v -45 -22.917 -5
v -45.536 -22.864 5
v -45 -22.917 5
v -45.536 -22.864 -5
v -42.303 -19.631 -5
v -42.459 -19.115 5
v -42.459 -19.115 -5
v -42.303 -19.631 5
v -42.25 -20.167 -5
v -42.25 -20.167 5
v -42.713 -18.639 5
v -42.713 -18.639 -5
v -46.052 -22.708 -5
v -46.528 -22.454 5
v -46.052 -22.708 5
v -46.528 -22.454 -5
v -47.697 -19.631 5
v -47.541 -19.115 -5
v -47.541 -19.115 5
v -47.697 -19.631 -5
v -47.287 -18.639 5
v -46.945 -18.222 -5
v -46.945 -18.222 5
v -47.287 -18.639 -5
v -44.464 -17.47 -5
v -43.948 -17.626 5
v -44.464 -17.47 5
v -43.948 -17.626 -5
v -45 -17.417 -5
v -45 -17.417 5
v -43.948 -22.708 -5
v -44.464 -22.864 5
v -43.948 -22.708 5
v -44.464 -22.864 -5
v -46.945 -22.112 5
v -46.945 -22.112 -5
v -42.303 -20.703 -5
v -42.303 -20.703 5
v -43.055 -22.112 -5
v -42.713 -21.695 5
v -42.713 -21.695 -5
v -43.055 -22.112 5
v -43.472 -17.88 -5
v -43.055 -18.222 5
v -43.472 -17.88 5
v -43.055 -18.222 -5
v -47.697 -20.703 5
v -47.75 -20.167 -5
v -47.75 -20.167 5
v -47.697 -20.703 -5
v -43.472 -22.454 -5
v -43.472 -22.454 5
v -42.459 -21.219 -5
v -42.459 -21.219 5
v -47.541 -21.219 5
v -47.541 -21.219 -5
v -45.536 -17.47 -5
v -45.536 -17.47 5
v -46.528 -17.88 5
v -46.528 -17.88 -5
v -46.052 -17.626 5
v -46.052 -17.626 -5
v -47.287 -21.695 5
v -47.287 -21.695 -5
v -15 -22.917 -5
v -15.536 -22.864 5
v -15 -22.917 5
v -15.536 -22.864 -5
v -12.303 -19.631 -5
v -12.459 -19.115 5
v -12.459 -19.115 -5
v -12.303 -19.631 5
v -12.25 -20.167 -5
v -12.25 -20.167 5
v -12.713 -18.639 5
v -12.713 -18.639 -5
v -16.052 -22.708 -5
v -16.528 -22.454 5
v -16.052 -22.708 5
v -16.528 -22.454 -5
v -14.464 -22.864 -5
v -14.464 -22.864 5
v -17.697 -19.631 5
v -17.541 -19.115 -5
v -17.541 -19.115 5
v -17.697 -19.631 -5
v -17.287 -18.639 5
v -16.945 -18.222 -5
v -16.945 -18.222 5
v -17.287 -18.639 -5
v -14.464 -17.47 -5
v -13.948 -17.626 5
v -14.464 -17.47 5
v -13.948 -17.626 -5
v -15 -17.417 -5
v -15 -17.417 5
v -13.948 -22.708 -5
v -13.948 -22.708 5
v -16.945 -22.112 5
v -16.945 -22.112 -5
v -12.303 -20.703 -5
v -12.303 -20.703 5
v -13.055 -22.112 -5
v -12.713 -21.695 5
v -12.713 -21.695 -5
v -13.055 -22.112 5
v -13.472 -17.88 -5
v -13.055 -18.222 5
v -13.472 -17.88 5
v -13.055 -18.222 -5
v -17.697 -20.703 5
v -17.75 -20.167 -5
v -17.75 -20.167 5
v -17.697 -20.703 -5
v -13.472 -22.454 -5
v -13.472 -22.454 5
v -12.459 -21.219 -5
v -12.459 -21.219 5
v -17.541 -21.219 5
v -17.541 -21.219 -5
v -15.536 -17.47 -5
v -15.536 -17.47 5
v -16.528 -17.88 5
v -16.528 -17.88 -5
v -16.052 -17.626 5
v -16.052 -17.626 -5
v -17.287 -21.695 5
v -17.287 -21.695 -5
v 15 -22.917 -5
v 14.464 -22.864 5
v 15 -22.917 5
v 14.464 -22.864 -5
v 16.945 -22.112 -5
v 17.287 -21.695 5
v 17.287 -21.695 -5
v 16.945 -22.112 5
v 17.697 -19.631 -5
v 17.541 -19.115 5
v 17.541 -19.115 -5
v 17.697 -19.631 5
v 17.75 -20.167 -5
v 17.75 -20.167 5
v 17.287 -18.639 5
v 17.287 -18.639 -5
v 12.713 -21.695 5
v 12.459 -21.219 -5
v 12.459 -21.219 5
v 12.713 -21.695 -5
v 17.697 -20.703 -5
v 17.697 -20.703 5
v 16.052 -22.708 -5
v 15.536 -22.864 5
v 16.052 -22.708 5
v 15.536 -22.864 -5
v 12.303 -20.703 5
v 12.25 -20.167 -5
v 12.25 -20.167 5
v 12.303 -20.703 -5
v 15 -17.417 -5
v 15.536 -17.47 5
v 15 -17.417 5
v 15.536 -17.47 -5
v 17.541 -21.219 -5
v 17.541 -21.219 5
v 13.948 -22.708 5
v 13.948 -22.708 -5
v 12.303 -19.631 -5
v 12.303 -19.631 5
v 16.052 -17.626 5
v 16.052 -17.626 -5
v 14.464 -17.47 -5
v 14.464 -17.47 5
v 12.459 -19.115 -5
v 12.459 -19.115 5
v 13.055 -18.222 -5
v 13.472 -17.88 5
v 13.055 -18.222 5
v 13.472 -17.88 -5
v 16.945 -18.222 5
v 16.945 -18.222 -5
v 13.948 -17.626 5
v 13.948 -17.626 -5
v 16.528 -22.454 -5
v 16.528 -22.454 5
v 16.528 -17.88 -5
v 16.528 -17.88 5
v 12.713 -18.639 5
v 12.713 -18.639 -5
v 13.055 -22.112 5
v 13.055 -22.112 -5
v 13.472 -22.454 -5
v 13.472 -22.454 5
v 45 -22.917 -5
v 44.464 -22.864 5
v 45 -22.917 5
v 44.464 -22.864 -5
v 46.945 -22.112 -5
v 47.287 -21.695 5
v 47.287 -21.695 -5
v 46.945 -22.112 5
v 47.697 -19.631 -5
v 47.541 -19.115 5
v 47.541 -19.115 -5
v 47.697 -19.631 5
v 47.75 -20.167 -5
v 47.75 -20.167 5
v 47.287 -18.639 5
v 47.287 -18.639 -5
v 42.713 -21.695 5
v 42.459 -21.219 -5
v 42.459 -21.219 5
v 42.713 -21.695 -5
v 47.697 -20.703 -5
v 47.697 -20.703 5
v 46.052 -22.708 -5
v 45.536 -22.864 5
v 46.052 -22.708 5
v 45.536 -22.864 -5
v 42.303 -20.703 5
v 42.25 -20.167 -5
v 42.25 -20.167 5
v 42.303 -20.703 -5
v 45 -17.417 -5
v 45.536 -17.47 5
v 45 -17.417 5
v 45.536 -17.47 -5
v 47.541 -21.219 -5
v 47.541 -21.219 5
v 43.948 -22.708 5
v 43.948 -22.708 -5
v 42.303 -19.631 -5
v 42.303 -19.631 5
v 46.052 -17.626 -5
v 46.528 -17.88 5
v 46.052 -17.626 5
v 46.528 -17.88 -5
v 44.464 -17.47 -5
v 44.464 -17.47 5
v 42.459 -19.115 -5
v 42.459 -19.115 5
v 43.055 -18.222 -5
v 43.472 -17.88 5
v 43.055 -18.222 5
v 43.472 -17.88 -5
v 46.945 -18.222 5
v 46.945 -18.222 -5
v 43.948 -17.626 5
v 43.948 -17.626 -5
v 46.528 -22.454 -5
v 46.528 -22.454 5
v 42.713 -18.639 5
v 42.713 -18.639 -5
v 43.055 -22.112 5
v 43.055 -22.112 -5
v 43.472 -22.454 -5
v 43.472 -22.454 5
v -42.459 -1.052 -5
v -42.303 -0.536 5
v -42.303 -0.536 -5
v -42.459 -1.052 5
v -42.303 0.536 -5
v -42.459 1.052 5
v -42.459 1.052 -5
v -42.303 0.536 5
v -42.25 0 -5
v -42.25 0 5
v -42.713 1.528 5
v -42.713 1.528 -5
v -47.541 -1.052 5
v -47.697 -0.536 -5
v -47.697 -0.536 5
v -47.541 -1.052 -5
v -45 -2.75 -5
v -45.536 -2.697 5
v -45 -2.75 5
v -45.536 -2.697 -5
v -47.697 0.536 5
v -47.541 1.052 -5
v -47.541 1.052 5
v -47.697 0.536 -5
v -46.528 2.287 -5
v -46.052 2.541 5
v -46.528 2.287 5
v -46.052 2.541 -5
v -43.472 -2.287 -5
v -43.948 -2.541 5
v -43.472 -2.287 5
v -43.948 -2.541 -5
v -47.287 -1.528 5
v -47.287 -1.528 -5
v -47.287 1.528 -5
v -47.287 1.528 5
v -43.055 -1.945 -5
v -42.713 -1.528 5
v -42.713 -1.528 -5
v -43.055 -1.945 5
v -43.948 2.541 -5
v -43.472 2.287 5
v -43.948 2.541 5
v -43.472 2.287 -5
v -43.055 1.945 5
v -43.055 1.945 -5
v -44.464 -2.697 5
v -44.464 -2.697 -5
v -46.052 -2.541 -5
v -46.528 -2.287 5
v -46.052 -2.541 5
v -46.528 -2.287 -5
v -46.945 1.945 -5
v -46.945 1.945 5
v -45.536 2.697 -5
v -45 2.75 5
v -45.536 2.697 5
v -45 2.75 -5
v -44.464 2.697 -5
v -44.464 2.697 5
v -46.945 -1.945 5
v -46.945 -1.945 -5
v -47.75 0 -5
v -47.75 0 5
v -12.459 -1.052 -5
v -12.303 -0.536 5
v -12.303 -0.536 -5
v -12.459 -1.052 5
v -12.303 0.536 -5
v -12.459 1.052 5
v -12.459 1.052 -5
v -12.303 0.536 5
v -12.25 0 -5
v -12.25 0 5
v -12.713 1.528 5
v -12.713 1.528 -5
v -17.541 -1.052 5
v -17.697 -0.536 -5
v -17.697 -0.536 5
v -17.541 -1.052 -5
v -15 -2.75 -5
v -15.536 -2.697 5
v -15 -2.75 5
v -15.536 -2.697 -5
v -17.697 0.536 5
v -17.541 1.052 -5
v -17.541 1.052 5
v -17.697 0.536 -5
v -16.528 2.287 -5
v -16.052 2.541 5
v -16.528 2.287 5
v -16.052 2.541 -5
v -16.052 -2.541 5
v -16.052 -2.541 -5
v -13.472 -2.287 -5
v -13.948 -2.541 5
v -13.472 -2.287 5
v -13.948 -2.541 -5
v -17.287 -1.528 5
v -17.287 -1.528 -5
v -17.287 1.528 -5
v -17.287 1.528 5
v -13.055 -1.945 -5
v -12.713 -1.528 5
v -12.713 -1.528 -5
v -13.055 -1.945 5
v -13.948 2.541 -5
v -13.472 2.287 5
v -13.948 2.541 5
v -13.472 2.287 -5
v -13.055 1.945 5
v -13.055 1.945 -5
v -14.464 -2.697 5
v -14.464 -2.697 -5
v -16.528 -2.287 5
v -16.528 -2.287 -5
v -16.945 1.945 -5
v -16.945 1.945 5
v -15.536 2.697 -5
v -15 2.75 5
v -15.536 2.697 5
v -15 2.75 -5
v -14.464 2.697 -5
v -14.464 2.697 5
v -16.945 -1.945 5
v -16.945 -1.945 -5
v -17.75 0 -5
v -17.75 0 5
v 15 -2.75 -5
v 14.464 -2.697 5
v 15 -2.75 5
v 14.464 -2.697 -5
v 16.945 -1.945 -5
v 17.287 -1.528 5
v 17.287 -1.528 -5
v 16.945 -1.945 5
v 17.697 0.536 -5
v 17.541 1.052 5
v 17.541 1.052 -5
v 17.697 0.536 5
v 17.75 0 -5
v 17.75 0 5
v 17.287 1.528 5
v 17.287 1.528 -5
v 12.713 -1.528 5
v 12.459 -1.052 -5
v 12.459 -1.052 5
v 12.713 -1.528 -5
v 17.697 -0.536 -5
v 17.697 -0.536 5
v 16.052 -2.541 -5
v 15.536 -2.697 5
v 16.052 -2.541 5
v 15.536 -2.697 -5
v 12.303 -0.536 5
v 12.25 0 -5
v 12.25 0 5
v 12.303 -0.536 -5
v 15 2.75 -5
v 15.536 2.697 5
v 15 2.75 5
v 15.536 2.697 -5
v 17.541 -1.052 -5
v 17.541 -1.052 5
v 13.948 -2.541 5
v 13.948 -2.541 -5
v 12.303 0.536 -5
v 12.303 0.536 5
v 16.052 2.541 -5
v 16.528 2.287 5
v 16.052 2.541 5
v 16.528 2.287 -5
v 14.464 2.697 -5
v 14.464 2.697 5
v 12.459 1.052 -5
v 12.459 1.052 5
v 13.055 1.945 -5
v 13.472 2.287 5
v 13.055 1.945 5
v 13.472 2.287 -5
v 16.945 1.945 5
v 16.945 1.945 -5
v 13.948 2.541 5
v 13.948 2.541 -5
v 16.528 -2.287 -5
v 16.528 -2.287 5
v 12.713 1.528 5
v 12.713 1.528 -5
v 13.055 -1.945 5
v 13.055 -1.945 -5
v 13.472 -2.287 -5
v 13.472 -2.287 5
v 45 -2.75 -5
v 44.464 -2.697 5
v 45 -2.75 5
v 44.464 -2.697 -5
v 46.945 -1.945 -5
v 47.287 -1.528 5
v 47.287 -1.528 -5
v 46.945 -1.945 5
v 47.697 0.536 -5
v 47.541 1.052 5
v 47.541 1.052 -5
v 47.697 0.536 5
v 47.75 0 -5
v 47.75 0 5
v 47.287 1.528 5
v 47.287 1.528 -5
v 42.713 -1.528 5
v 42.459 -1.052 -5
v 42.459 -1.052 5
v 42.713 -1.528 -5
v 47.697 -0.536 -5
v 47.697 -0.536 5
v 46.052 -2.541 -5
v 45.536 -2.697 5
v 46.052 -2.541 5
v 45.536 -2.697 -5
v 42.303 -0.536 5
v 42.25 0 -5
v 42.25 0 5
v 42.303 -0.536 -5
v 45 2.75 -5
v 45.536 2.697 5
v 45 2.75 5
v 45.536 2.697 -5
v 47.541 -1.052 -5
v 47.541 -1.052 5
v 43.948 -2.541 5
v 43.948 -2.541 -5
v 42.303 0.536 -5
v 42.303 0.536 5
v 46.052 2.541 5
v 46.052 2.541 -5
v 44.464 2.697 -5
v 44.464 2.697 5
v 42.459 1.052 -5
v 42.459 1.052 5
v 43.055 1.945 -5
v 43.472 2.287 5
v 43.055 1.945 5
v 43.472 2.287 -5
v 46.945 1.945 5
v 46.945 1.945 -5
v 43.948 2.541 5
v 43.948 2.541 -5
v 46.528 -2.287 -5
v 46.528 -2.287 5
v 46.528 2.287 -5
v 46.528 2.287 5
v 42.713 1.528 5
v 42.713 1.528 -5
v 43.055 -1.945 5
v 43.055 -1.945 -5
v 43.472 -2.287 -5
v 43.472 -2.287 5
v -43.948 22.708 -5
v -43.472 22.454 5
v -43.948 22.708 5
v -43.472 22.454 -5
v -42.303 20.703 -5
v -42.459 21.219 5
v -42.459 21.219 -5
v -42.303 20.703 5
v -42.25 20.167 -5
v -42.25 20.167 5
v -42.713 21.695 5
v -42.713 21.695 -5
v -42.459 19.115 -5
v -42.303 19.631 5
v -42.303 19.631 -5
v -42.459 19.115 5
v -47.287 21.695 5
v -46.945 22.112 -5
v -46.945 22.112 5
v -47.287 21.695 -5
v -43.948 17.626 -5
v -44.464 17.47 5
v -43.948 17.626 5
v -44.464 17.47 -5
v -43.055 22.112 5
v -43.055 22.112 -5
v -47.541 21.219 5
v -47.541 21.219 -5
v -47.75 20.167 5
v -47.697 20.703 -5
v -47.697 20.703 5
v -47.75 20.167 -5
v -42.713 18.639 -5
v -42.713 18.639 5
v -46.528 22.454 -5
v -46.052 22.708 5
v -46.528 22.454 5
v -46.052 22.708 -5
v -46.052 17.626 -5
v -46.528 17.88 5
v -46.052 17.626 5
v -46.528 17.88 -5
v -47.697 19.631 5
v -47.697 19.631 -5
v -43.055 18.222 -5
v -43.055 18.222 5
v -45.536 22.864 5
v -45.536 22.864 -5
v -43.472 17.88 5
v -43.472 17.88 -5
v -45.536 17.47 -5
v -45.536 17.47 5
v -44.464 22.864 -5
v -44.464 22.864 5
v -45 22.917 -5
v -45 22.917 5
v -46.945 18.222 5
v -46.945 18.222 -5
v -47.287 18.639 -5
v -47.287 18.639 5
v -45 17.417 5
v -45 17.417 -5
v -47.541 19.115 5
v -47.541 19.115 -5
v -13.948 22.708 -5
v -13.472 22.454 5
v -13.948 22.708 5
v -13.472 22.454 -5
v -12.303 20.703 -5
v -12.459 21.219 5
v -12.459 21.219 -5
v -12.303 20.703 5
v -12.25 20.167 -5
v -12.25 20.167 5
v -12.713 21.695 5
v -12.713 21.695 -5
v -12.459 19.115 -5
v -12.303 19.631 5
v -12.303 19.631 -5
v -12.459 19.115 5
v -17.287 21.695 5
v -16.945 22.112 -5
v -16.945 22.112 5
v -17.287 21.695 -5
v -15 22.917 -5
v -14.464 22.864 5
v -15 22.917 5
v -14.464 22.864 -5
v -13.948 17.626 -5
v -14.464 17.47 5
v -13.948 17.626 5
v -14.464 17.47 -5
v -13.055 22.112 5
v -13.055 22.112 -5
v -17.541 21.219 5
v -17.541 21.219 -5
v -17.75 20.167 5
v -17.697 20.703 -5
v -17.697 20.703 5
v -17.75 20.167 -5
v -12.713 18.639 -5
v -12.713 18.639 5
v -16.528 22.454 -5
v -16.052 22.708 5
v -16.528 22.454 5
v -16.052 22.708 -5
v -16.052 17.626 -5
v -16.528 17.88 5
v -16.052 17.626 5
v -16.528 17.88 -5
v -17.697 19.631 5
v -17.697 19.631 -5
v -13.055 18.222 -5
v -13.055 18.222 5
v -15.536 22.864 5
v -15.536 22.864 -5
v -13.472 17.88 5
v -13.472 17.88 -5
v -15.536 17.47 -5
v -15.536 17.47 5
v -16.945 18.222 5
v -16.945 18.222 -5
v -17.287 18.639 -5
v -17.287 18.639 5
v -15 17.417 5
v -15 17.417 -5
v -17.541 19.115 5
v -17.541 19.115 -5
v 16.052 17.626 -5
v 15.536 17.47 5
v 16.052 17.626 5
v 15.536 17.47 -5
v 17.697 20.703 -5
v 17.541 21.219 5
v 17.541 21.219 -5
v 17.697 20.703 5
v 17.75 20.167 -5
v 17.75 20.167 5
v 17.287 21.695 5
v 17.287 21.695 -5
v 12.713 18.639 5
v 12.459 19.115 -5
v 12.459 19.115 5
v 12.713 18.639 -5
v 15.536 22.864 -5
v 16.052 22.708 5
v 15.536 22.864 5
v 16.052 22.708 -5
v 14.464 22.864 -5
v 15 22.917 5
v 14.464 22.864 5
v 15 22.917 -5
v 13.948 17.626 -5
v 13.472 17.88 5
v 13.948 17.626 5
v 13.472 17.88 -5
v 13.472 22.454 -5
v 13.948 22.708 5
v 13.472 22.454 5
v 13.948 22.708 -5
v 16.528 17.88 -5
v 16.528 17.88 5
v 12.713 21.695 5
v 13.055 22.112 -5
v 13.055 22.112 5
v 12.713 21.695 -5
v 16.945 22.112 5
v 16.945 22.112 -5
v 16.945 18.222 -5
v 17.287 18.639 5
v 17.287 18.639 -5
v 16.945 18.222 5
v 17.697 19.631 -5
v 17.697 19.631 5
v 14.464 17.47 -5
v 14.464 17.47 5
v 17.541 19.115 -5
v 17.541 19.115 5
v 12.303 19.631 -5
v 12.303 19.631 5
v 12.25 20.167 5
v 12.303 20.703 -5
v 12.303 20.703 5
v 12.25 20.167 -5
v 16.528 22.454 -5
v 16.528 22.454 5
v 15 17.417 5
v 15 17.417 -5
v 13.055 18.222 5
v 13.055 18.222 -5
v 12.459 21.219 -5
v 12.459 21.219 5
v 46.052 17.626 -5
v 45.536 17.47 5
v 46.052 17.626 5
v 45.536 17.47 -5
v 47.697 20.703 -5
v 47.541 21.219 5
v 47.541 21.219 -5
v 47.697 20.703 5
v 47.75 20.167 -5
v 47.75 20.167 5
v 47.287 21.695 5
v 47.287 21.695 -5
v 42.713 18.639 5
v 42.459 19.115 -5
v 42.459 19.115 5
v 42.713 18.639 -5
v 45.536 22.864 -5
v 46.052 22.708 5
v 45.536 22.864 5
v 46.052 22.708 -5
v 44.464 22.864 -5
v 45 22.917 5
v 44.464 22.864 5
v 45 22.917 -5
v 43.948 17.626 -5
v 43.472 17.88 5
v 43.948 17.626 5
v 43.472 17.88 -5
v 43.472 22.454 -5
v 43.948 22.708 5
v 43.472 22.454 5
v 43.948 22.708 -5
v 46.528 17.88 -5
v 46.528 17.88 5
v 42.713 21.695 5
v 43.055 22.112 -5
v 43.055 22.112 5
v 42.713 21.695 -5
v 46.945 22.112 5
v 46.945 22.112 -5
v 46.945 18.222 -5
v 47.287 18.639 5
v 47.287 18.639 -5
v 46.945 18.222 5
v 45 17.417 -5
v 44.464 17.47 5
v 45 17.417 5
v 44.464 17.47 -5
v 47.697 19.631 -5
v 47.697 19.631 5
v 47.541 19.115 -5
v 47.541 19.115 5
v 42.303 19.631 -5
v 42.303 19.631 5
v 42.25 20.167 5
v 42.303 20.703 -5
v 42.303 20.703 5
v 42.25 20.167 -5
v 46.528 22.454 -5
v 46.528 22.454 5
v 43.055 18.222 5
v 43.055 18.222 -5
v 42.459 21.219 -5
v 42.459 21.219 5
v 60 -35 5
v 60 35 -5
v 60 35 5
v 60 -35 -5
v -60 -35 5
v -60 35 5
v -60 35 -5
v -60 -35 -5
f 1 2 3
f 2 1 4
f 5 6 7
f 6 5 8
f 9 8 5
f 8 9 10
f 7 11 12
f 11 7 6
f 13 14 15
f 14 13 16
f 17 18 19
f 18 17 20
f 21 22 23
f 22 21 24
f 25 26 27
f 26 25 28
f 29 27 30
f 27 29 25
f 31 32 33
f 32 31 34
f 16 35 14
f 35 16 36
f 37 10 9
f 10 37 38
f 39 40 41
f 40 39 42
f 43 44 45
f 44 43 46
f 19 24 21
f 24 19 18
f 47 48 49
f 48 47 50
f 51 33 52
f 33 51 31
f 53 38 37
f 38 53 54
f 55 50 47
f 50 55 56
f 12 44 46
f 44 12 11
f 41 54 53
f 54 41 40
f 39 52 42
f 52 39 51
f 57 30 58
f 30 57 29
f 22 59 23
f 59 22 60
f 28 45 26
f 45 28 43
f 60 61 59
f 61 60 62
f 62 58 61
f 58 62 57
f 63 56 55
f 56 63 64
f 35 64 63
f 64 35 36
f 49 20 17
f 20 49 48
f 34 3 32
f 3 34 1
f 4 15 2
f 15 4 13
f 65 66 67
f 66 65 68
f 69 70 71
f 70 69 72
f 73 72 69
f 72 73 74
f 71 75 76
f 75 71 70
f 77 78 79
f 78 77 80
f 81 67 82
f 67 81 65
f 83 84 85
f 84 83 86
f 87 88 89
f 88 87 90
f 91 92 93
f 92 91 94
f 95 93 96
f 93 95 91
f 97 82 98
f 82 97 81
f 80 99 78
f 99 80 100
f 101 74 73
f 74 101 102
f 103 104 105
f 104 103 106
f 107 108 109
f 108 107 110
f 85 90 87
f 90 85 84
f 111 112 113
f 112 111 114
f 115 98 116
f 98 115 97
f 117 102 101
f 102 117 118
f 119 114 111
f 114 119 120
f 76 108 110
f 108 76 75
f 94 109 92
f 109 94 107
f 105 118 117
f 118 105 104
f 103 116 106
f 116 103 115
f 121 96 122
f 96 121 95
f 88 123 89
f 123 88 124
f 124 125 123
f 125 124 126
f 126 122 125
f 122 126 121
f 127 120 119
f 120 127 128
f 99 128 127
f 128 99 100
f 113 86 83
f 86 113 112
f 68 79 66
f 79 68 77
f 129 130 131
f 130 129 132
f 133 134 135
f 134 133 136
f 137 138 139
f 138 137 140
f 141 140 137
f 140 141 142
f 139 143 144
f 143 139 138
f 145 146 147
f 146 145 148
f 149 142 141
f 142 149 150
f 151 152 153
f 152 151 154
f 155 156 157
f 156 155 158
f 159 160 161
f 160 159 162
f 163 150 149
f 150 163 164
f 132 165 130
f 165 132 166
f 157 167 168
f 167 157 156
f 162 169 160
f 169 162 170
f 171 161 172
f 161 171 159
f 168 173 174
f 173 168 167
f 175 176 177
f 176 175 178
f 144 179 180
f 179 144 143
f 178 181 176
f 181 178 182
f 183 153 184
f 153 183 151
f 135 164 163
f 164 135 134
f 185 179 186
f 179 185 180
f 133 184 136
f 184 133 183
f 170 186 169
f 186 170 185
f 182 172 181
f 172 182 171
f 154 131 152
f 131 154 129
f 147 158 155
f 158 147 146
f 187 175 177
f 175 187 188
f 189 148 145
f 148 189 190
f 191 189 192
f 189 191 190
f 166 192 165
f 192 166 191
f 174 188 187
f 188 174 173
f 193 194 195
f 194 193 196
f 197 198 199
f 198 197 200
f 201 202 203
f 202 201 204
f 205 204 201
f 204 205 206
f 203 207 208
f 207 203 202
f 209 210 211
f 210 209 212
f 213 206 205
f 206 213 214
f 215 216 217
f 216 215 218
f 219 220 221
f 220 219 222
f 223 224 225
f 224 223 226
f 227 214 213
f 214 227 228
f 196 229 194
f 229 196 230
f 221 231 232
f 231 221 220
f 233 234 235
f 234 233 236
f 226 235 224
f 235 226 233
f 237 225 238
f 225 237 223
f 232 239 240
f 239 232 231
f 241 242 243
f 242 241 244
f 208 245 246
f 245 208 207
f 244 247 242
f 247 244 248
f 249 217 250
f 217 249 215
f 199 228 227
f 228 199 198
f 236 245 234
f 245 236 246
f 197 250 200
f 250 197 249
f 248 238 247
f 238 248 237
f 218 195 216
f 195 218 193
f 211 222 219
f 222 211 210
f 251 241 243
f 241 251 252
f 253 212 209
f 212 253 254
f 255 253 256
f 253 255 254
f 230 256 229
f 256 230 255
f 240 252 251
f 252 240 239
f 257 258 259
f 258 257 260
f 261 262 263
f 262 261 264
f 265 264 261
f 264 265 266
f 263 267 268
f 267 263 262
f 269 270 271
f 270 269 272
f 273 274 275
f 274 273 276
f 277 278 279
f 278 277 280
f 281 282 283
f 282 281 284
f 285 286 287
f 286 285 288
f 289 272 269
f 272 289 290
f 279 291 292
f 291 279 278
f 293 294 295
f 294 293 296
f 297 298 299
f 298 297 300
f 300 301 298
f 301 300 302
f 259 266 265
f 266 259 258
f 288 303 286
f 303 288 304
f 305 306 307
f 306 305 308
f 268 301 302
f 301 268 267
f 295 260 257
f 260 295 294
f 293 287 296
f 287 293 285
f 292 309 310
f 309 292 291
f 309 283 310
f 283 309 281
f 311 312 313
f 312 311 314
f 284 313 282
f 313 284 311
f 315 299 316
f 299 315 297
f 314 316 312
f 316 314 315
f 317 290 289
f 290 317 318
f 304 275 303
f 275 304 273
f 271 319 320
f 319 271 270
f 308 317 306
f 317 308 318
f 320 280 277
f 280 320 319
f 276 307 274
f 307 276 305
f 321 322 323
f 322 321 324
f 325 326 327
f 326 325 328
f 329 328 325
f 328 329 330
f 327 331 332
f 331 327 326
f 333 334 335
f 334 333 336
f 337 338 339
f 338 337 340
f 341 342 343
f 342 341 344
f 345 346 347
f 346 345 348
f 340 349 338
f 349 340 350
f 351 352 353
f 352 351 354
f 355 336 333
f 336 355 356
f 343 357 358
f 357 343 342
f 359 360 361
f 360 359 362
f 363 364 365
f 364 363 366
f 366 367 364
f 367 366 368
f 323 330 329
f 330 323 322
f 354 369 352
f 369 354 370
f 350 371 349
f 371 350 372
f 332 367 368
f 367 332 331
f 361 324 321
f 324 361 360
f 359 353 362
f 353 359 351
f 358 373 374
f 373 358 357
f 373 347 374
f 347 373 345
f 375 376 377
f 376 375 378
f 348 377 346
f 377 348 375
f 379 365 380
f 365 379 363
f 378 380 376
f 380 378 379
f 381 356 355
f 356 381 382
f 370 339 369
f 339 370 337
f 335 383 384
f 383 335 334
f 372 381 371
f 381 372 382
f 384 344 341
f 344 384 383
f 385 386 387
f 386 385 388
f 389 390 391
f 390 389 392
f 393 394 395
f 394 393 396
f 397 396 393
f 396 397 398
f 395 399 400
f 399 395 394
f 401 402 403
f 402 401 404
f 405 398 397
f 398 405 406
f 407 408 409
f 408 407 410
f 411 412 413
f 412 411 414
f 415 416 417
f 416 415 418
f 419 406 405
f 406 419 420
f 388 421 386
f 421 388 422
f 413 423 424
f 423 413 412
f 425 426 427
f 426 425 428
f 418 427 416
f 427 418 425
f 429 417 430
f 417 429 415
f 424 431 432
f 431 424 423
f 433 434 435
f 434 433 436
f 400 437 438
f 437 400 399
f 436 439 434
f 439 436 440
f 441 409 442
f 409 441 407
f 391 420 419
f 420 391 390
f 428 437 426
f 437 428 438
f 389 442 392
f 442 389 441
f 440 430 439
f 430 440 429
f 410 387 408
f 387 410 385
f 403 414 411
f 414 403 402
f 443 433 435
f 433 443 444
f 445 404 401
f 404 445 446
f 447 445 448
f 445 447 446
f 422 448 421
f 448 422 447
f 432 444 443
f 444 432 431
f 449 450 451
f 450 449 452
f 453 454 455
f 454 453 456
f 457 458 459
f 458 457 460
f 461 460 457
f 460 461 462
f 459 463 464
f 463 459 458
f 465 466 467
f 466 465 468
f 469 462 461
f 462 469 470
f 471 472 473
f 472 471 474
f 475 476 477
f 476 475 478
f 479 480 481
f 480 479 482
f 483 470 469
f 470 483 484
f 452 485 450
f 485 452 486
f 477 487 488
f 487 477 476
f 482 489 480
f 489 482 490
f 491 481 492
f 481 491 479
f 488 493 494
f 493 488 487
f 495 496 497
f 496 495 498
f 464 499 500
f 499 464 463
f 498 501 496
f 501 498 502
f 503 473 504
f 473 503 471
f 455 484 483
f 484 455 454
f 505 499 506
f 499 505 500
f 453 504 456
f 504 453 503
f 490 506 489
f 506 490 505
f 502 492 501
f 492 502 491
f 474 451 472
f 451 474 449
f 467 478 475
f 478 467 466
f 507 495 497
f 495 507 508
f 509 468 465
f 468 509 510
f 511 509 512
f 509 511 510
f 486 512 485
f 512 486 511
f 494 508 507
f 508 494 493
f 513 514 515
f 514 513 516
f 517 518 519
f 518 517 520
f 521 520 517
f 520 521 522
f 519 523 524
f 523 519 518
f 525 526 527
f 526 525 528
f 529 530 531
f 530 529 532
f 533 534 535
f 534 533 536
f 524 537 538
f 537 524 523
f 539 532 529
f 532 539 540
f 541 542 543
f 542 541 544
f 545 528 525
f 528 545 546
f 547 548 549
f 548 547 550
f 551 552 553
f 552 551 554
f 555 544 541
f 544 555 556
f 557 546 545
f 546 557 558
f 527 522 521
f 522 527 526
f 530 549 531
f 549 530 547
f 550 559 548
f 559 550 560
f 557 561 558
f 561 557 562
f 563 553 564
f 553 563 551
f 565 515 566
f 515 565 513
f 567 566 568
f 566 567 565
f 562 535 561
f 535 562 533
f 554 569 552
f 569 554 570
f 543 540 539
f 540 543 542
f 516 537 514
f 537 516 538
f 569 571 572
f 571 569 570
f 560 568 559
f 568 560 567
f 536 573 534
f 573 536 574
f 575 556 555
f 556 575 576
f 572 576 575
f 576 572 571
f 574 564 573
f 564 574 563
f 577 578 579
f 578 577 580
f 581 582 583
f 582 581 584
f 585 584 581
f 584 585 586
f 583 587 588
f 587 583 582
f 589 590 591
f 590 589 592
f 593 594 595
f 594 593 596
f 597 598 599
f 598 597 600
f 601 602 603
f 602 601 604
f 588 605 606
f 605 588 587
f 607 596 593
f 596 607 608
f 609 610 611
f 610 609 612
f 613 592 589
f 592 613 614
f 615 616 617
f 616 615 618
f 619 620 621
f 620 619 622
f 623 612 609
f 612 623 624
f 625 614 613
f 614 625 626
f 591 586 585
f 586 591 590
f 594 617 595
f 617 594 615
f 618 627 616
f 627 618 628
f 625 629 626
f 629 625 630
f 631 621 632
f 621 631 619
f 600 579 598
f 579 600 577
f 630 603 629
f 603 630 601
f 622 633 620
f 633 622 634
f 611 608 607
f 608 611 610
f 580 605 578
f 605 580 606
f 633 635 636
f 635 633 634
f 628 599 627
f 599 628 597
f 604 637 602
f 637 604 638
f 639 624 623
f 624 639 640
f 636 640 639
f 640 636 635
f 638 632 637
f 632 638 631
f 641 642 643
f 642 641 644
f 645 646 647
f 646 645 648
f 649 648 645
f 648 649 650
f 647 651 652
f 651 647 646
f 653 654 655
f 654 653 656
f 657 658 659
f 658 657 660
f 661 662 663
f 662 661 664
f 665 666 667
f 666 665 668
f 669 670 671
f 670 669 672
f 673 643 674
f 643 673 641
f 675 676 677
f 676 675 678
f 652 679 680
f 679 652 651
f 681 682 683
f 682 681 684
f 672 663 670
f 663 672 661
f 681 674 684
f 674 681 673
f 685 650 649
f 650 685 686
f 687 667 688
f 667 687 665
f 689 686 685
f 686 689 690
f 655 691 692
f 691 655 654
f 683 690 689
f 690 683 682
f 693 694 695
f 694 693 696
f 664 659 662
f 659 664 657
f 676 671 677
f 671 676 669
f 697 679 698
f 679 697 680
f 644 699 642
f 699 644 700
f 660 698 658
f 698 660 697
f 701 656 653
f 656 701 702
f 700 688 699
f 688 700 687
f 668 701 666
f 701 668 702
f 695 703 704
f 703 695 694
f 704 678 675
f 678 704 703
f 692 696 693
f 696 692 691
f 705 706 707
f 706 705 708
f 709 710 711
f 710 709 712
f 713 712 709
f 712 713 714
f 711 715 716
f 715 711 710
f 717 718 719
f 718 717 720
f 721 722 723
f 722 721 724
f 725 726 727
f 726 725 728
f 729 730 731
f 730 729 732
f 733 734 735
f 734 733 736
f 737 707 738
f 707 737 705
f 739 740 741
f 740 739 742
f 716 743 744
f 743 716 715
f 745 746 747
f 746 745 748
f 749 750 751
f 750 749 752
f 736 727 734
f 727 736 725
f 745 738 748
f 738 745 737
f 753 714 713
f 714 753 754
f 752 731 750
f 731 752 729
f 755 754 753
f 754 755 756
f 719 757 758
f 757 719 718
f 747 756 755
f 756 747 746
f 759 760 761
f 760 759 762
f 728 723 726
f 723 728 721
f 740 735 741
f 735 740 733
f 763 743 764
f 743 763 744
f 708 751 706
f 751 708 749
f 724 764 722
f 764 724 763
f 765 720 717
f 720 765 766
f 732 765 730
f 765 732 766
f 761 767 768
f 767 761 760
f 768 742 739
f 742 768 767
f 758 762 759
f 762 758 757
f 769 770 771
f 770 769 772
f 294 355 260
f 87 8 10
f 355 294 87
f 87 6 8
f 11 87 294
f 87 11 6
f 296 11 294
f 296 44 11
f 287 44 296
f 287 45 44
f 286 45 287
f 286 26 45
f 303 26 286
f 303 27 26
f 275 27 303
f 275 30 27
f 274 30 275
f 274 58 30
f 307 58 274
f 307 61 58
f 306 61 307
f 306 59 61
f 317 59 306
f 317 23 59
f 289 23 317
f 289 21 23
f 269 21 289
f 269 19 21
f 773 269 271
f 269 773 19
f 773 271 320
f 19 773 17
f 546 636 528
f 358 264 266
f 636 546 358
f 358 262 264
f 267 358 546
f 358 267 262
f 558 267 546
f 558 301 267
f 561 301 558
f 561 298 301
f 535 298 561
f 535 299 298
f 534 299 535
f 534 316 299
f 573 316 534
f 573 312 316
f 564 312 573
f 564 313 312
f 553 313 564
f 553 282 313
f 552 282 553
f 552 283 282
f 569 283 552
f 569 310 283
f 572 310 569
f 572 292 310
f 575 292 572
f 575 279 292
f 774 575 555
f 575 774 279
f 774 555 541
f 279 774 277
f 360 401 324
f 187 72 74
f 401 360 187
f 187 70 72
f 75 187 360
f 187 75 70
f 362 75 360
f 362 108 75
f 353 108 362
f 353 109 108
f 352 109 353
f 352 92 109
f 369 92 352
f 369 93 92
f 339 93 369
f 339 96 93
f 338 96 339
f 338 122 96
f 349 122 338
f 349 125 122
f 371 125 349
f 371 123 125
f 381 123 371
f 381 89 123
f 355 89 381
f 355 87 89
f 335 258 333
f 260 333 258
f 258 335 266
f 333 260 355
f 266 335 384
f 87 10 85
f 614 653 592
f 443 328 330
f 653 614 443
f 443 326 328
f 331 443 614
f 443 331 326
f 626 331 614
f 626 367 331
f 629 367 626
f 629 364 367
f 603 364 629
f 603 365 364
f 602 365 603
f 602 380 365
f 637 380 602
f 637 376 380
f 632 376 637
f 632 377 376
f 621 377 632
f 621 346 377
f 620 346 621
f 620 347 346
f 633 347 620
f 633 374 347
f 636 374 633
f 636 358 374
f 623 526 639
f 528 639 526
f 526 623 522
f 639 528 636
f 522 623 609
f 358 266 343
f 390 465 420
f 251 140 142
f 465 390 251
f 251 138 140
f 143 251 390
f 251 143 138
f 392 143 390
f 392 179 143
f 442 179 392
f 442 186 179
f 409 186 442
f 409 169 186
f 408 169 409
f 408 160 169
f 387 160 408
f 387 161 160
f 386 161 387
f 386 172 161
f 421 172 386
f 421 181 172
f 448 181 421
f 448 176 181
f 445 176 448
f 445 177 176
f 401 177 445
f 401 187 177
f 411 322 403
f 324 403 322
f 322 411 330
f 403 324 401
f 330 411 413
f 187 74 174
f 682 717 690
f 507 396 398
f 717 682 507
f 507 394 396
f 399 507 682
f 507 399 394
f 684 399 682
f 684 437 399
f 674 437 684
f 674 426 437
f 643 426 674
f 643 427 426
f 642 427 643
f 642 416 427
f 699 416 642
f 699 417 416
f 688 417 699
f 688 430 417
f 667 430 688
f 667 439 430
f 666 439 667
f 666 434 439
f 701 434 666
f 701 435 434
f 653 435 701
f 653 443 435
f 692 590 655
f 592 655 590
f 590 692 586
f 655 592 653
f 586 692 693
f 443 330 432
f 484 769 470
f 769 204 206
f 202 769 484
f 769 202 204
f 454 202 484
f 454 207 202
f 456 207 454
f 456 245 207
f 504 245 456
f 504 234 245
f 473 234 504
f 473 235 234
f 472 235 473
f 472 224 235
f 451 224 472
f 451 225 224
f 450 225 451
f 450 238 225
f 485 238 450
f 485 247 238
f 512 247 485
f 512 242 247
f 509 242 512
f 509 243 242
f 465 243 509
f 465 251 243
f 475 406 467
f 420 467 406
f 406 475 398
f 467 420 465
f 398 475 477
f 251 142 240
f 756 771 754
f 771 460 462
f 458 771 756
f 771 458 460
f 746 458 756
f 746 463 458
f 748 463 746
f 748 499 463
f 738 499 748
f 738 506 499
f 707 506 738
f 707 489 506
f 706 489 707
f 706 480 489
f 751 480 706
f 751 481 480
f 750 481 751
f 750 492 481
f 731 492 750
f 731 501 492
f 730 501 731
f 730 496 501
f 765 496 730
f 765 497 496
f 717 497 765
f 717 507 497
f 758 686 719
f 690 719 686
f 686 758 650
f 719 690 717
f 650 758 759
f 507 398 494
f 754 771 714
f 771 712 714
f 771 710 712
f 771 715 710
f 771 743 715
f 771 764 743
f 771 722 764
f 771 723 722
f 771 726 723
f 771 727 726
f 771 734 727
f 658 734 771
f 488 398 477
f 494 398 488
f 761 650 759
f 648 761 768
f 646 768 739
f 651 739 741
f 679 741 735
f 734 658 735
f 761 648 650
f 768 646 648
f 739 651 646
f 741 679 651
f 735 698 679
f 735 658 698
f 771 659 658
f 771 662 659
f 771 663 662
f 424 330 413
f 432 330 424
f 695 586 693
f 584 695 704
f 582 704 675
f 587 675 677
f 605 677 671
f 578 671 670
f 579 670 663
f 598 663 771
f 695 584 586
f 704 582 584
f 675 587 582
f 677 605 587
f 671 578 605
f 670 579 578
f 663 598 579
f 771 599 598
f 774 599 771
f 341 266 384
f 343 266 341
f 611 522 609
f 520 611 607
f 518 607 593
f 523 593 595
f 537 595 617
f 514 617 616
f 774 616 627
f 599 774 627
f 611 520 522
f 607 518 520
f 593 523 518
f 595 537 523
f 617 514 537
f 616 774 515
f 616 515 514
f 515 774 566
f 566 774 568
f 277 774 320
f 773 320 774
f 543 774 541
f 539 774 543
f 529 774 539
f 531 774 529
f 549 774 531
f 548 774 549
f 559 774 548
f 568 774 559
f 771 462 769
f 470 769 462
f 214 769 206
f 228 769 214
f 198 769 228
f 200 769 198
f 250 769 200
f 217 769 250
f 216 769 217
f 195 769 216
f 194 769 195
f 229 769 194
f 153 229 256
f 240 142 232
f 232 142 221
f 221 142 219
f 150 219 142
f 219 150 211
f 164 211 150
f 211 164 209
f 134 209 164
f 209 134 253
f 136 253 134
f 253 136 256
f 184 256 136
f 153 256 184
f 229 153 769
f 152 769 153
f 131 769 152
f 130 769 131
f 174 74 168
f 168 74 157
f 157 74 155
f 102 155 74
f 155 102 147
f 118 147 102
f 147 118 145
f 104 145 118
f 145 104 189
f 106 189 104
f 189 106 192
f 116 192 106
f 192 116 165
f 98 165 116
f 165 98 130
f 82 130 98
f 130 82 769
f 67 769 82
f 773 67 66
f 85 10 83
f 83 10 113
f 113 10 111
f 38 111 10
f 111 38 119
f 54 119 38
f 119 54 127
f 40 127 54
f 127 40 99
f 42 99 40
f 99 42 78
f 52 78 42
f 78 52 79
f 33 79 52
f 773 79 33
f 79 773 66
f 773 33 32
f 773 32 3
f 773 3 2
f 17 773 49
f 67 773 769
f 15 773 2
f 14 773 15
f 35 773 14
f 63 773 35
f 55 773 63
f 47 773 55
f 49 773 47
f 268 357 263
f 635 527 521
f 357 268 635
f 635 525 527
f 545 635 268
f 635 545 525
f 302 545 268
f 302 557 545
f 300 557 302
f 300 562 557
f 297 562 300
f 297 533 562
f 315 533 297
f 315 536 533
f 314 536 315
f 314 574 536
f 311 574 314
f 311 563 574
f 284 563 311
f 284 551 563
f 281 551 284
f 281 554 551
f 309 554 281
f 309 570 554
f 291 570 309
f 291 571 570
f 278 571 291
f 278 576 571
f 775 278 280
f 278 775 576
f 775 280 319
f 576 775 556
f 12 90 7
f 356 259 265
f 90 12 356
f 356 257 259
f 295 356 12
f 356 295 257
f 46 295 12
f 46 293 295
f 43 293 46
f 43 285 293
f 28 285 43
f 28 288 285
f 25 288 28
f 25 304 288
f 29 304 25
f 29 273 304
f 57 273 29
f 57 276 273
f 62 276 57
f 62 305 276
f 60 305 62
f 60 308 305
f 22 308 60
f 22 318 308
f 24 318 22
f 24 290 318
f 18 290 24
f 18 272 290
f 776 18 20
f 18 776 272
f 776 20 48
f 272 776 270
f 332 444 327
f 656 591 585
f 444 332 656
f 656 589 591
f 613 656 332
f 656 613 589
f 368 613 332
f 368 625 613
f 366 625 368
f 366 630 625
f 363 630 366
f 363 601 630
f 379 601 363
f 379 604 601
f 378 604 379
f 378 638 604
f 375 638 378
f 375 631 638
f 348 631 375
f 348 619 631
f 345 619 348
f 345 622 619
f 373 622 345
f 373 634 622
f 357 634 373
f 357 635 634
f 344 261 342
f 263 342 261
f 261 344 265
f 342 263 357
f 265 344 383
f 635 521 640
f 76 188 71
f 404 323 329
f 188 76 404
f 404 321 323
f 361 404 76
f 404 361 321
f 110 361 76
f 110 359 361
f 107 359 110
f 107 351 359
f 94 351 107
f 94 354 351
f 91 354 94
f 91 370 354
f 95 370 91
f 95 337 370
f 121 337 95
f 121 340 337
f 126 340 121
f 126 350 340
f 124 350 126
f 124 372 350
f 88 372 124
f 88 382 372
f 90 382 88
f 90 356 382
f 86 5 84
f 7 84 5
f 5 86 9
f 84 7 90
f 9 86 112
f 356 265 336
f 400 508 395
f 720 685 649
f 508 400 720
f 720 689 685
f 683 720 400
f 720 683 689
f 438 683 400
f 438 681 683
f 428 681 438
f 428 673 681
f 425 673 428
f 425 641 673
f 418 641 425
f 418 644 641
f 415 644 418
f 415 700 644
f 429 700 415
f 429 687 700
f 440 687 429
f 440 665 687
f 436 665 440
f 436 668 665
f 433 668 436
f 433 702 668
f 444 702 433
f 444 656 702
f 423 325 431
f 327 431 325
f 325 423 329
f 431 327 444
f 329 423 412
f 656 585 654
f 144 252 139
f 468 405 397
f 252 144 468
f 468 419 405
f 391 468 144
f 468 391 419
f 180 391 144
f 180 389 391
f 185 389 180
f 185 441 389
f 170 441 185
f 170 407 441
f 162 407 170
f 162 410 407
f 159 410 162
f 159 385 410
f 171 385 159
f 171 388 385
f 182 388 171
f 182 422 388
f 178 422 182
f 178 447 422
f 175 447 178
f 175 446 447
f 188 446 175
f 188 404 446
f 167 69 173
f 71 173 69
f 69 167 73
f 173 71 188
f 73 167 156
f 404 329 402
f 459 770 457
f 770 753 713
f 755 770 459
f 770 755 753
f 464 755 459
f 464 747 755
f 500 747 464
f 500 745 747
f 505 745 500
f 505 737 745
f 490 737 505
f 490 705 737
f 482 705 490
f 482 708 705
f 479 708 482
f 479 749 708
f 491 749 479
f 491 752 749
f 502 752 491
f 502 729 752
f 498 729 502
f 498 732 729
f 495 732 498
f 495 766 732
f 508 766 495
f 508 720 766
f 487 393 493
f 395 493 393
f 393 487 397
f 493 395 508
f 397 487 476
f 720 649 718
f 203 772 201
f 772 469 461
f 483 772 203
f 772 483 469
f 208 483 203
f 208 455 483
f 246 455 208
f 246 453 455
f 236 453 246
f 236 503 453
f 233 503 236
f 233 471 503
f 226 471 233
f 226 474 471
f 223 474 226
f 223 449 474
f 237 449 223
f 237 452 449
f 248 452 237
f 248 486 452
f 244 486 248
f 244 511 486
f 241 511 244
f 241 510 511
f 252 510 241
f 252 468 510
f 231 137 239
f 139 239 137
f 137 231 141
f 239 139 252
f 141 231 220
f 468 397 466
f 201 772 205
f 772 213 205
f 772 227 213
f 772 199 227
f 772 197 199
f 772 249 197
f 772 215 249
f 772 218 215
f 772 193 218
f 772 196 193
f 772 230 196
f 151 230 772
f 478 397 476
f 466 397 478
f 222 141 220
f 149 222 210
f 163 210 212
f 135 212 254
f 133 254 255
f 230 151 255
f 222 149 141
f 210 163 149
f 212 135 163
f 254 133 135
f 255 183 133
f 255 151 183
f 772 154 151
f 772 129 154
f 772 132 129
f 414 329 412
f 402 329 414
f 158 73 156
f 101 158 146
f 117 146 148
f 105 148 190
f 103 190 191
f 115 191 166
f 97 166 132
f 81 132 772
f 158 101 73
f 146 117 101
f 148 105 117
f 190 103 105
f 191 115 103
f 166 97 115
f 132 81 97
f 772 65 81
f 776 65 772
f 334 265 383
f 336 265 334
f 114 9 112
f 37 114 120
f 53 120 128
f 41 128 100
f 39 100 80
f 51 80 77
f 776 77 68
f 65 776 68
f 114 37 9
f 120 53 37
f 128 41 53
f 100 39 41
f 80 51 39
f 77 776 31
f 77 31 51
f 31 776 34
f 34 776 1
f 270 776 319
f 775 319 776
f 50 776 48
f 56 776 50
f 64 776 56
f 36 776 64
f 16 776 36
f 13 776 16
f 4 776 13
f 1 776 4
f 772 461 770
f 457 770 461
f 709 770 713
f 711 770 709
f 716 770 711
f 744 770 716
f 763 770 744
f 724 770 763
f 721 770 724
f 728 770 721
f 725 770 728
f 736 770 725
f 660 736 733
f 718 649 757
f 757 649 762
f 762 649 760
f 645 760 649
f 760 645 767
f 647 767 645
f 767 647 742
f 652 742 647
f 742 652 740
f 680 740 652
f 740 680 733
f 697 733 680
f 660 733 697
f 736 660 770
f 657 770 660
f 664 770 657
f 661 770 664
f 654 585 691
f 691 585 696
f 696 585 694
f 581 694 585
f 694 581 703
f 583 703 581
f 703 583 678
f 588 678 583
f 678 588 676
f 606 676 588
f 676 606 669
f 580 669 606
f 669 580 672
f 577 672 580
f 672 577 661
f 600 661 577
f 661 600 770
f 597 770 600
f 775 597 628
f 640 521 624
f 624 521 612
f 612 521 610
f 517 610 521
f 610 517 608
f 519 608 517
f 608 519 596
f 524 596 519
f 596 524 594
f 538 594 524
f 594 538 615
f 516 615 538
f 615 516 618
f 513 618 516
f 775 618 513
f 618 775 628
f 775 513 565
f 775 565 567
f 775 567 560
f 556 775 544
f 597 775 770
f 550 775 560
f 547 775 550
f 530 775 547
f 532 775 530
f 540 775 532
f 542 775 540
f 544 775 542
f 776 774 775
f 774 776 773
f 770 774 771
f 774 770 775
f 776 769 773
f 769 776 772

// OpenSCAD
$fn = 32;

// ----------------------------------------------------------------------
// Perforated panel 120 x 70 x 10
// 3 x 4 Ø5.5 holes, grid layout
// ----------------------------------------------------------------------

// --- parameters (mm) ---
panel = [120, 70, 10];  // overall size (x, y, z)
hole_d = 5.5;           // hole diameter
pitch_x = 30;           // hole pitch along X
pitch_y = 20.167;       // hole pitch along Y

// --- derived feature positions (mm) ---
margin = hole_d / 2 + 2;            // = 4.75   clearance from the panel edge
cols = floor((panel[0] - 2 * margin) / pitch_x) + 1;  // = 4   how many columns fit in X
rows = floor((panel[1] - 2 * margin) / pitch_y) + 1;  // = 3   how many rows fit in Y
span_x = (cols - 1) * pitch_x + 0;  // = 90   width of the field
span_y = (rows - 1) * pitch_y;      // = 40.33   height of the field
origin_x = -span_x / 2;             // = -45   X of the first hole
origin_y = -span_y / 2;             // = -20.17   Y of the first row
holes = rows * cols;                // = 12   holes in total
feature_centers = [
  [origin_x + 0 * pitch_x, origin_y + 0 * pitch_y],
  [origin_x + 1 * pitch_x, origin_y + 0 * pitch_y],
  [origin_x + 2 * pitch_x, origin_y + 0 * pitch_y],
  [origin_x + 3 * pitch_x, origin_y + 0 * pitch_y],
  [origin_x + 0 * pitch_x, origin_y + 1 * pitch_y],
  [origin_x + 1 * pitch_x, origin_y + 1 * pitch_y],
  [origin_x + 2 * pitch_x, origin_y + 1 * pitch_y],
  [origin_x + 3 * pitch_x, origin_y + 1 * pitch_y],
  [origin_x + 0 * pitch_x, origin_y + 2 * pitch_y],
  [origin_x + 1 * pitch_x, origin_y + 2 * pitch_y],
  [origin_x + 2 * pitch_x, origin_y + 2 * pitch_y],
  [origin_x + 3 * pitch_x, origin_y + 2 * pitch_y]
];   // hole centres, used verbatim by the cutter loop

// panel outline, every hole through
difference() {
  cube(panel, center = true);
  for (centre = feature_centers)
    translate([centre[0], centre[1], 0])
      cylinder(d = hole_d, h = panel[2] + 2, center = true);
}
